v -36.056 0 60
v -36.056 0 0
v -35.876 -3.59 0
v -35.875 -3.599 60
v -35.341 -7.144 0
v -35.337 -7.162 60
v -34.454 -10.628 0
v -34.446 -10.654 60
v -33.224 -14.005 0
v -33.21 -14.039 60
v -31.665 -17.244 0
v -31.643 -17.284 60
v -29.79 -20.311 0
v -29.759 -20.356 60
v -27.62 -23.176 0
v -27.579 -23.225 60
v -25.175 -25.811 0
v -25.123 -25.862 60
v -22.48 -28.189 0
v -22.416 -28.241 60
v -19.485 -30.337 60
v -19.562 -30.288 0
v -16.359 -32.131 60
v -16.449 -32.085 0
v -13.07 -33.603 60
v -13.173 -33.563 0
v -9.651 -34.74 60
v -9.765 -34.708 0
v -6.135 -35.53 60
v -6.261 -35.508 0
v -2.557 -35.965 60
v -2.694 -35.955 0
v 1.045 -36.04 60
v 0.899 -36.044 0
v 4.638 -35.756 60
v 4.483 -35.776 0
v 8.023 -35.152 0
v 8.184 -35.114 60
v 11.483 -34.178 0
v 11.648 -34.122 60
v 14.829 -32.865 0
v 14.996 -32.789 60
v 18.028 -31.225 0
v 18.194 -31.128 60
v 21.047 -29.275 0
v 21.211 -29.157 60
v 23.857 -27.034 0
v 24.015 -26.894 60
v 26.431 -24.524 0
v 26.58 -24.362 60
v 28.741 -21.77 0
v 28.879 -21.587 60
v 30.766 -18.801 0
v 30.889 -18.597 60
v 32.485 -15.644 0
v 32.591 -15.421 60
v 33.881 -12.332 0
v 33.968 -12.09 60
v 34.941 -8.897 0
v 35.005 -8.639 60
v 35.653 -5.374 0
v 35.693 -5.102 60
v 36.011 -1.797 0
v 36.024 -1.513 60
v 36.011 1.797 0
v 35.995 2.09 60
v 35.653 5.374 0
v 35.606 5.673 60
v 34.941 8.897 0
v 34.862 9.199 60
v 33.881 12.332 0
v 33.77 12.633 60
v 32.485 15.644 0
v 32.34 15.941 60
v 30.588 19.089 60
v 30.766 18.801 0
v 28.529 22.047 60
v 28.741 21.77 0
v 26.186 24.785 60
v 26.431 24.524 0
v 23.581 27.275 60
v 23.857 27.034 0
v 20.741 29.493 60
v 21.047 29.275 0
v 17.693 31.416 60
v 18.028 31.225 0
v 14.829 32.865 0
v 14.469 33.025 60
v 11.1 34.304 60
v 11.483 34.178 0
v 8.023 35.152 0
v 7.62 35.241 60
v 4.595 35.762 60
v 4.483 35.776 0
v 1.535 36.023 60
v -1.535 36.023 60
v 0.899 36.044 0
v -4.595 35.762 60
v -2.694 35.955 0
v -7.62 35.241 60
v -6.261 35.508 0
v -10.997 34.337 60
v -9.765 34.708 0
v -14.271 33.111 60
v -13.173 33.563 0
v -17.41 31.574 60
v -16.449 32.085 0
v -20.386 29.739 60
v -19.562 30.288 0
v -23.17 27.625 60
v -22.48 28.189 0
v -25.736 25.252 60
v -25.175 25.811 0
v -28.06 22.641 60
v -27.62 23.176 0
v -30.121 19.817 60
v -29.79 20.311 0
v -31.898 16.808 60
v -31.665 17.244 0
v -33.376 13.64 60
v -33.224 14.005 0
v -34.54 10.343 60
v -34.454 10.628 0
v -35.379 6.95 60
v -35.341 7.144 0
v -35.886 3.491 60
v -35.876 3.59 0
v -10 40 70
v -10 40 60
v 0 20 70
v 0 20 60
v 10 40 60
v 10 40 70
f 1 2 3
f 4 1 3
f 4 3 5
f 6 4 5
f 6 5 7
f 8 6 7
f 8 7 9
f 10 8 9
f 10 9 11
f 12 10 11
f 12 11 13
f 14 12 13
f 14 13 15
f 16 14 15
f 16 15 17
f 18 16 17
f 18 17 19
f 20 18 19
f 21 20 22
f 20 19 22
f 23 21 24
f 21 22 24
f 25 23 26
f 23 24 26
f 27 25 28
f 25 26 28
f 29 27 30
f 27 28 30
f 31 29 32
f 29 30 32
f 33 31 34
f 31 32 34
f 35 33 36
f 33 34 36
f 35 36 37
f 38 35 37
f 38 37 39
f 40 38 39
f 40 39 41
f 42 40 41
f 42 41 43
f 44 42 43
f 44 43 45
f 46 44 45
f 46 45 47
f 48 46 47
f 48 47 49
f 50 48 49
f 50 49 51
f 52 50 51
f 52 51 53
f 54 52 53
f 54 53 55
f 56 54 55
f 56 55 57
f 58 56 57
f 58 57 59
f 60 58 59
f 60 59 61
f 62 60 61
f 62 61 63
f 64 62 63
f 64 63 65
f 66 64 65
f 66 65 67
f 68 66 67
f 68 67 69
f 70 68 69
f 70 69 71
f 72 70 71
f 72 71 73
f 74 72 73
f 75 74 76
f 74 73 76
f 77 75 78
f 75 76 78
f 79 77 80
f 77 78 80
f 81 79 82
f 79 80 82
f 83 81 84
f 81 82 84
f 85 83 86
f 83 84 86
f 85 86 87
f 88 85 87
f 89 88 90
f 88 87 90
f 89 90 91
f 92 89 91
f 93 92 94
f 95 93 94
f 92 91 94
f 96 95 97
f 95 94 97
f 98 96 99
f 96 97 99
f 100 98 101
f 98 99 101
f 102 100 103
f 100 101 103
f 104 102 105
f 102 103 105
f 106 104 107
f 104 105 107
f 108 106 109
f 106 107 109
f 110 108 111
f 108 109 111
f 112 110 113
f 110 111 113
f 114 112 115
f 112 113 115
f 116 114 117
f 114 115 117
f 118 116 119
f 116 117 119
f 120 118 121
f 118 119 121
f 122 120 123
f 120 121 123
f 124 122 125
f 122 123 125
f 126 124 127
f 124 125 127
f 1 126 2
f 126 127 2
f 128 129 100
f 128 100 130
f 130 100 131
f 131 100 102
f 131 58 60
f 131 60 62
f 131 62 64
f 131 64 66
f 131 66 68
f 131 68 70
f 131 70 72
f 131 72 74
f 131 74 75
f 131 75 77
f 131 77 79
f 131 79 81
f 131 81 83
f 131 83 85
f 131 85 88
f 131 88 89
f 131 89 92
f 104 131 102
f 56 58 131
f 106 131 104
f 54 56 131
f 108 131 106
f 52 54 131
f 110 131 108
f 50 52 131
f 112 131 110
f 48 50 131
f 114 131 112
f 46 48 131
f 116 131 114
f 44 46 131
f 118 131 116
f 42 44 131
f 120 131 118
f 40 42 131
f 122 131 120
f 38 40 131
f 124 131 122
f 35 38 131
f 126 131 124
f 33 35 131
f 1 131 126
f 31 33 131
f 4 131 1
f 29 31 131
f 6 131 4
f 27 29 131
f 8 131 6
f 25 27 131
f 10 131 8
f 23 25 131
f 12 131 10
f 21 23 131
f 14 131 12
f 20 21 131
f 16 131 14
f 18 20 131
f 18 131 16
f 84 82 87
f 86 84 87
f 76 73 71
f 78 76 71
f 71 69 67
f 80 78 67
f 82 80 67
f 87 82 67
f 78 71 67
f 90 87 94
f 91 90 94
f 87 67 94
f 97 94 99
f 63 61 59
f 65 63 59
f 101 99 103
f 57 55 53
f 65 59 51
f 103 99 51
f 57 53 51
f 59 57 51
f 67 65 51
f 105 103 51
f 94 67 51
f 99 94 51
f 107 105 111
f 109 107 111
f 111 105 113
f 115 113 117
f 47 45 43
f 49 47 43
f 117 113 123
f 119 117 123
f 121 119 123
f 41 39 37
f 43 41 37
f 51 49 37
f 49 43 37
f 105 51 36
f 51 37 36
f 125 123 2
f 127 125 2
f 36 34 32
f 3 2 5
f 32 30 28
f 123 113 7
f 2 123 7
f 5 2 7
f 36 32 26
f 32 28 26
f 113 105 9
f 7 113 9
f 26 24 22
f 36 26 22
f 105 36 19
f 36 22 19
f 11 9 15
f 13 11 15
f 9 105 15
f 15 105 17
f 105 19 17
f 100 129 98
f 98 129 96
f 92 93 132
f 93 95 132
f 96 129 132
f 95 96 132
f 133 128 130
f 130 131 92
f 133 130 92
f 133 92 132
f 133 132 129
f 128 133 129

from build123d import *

# Parameters (mm, degrees)
SKETCH1_R           = 36.055512755
BOSS_EXTRUDE1_DEPTH = 60
BOSS_EXTRUDE2_DEPTH = 10


with BuildPart() as part:
    # Sketch1 → Boss-Extrude1 (new body)
    with BuildSketch(Plane.XY):
        Circle(SKETCH1_R)
    extrude(amount=BOSS_EXTRUDE1_DEPTH)

    # Sketch3 → Boss-Extrude2 (add)
    with BuildSketch(Plane.XY.offset(60)):
        Polygon((-10, 40), (0, 20), (10, 40), align=None)
    extrude(amount=BOSS_EXTRUDE2_DEPTH)


solid = part.part
